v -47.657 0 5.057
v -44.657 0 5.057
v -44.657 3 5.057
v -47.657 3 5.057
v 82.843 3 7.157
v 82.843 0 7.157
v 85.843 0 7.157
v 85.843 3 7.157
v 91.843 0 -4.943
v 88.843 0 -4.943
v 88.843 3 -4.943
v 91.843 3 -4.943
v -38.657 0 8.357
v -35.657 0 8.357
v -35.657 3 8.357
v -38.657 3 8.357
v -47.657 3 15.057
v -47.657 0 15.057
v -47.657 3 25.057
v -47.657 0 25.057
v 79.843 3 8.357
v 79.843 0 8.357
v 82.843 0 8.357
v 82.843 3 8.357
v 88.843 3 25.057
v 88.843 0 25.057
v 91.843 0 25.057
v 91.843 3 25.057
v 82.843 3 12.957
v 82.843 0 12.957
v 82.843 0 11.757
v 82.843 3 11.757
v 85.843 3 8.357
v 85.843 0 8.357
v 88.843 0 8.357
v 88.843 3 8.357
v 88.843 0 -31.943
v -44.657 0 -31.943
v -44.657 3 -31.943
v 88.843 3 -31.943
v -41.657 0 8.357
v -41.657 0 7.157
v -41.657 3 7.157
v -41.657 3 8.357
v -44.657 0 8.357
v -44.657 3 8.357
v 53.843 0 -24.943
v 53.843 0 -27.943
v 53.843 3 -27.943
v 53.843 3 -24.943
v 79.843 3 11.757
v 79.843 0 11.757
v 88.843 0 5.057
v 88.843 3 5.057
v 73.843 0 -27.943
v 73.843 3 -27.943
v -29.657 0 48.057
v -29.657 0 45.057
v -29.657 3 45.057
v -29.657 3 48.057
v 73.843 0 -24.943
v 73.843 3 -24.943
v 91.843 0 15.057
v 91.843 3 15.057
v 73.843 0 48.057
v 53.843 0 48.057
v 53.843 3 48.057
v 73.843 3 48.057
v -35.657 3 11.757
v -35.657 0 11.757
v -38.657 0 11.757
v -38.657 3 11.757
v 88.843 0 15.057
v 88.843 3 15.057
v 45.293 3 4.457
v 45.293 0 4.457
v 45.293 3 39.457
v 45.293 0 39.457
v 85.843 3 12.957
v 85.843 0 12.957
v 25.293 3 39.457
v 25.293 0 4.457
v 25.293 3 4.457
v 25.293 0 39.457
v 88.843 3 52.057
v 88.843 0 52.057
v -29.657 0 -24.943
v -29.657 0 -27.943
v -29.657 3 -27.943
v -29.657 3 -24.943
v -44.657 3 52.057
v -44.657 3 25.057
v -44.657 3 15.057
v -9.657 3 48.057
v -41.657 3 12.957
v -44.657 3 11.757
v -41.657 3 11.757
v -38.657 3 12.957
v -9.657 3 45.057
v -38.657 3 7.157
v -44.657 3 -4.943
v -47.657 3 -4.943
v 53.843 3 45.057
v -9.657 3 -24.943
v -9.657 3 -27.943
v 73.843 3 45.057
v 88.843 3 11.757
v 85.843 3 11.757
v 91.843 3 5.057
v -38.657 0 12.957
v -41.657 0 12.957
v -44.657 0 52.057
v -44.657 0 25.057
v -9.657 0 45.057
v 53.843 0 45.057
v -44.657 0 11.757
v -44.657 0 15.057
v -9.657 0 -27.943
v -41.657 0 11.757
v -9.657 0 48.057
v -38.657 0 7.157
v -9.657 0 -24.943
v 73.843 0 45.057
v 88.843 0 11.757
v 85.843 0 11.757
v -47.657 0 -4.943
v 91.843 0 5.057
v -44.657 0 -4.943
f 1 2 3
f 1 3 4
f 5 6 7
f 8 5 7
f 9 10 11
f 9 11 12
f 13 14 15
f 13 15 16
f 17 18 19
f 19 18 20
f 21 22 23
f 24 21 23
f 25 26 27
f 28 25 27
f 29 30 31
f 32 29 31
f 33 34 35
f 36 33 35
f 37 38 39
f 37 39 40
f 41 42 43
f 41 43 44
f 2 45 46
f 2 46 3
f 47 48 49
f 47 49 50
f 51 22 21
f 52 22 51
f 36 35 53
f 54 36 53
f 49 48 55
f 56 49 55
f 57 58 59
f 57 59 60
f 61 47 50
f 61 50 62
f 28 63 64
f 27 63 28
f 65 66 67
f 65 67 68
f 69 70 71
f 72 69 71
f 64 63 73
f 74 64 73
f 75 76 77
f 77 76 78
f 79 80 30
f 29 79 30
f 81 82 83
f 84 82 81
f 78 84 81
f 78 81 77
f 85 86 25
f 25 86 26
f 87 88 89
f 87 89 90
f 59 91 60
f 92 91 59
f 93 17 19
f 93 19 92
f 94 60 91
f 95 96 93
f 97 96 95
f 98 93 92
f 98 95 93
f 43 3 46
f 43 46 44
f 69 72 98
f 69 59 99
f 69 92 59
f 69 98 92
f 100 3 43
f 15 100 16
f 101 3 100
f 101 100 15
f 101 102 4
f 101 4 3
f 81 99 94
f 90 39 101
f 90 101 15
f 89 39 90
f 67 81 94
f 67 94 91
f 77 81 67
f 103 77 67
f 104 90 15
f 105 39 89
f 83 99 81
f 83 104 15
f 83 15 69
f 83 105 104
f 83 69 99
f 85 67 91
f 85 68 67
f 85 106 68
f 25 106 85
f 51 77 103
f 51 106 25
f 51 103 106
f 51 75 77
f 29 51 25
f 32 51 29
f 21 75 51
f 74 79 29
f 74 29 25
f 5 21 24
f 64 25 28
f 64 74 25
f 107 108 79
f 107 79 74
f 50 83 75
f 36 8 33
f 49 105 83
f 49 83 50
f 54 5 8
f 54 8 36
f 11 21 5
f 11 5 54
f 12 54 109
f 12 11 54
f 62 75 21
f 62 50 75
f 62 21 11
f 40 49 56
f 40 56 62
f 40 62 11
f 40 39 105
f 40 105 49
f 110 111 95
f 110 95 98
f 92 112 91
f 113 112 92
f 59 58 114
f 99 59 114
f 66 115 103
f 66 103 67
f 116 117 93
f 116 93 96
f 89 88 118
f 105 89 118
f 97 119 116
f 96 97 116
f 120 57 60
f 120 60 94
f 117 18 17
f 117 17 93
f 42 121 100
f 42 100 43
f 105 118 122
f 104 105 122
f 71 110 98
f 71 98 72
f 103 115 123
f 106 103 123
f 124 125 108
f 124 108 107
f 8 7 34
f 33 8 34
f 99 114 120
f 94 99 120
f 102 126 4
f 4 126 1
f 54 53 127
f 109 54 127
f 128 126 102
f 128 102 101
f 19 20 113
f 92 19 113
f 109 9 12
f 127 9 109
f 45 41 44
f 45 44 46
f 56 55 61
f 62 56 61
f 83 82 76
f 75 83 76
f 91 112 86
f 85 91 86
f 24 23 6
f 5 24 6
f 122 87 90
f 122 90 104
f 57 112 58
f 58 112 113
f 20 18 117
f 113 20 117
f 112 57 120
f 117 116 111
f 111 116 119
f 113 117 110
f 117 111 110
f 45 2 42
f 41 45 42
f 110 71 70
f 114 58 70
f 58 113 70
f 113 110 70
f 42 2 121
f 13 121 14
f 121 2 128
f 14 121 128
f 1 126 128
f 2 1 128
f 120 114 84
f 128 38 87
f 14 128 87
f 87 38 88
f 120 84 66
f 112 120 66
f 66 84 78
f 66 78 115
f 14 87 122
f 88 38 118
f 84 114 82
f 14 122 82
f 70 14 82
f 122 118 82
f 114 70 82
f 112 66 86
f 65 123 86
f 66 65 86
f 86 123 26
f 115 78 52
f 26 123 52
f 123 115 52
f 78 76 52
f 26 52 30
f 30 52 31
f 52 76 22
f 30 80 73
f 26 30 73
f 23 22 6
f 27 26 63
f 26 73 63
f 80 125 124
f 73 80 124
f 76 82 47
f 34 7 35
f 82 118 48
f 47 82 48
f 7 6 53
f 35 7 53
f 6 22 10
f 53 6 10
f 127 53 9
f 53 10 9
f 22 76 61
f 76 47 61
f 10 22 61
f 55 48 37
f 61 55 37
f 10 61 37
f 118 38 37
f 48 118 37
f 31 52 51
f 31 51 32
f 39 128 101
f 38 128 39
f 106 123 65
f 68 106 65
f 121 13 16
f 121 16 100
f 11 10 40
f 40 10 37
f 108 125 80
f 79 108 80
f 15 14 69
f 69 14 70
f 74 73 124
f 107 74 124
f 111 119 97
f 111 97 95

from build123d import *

# Parameters (mm, degrees)
SKETCH1_W           = 133.500000388
SKETCH1_H           = 84
BOSS_EXTRUDE1_DEPTH = 3
SKETCH2_W           = 20
SKETCH2_H           = 3
CUT_EXTRUDE1_DEPTH  = 104.014399147
SKETCH3_W           = 3
SKETCH3_H           = 30
BOSS_EXTRUDE2_DEPTH = 3
SKETCH4_W           = 3
SKETCH4_H           = 3.4
CUT_EXTRUDE2_DEPTH  = 106.612611798
SKETCH6_W           = 20
SKETCH6_H           = 35.000000221
CUT_EXTRUDE3_DEPTH  = 106.612611798


with BuildPart() as part:
    # Sketch1 → Boss-Extrude1 (new body)
    with BuildSketch(Plane(origin=(0, 0, 0), x_dir=(1, 0, 0), z_dir=(0, 1, 0))):
        with Locations((22.092889694, -10.056770433)):
            Rectangle(SKETCH1_W, SKETCH1_H)
    extrude(amount=BOSS_EXTRUDE1_DEPTH)

    # Sketch2 → Cut-Extrude1 (cut, through all)
    with BuildSketch(Plane.XZ):
        with Locations((63.842889888, 46.556770433)):
            Rectangle(SKETCH2_W, SKETCH2_H)
        with Locations((-19.6571105, 46.556770433)):
            Rectangle(SKETCH2_W, SKETCH2_H)
        with Locations((-19.6571105, -26.443229567)):
            Rectangle(SKETCH2_W, SKETCH2_H)
        with Locations((63.842889888, -26.443229567)):
            Rectangle(SKETCH2_W, SKETCH2_H)
    extrude(amount=-CUT_EXTRUDE1_DEPTH, mode=Mode.SUBTRACT)

    # Sketch3 → Boss-Extrude2 (add, through all)
    with BuildSketch(Plane.XZ):
        with Locations((90.342889888, 10.056770433)):
            Rectangle(SKETCH3_W, SKETCH3_H)
        with Locations((-46.1571105, 10.056770433)):
            Rectangle(SKETCH3_W, SKETCH3_H)
    extrude(amount=-BOSS_EXTRUDE2_DEPTH)

    # Sketch4 → Cut-Extrude2 (cut, symmetric)
    with BuildSketch(Plane.XZ):
        Polygon((88.842889888, 8.356770433), (88.842889888, 5.056770433), (91.842889888, 5.056770433), (91.842889888, 15.056770433), (88.842889888, 15.056770433), (88.842889888, 11.756770433), align=None)
        with Locations((87.342889888, 10.056770433)):
            Rectangle(SKETCH4_W, SKETCH4_H)
        Polygon((85.842889888, 7.156770433), (85.842889888, 8.356770433), (85.842889888, 11.756770433), (85.842889888, 12.956770433), (82.842889888, 12.956770433), (82.842889888, 11.756770433), (82.842889888, 8.356770433), (82.842889888, 7.156770433), align=None)
        with Locations((81.342889888, 10.056770433)):
            Rectangle(SKETCH4_W, SKETCH4_H)
    cut_extrude2 = extrude(amount=CUT_EXTRUDE2_DEPTH, both=True, mode=Mode.SUBTRACT)

    # Mirror1: Cut-Extrude2 across plane
    add(cut_extrude2.mirror(Plane(origin=(22.092889694, 0, 0), x_dir=(0, 0, 1), z_dir=(1, 0, 0))), mode=Mode.SUBTRACT)

    # Sketch6 → Cut-Extrude3 (cut, through all)
    with BuildSketch(Plane.XZ):
        with Locations((35.292890439, 21.956770364)):
            Rectangle(SKETCH6_W, SKETCH6_H)
    extrude(amount=-CUT_EXTRUDE3_DEPTH, mode=Mode.SUBTRACT)


solid = part.part
